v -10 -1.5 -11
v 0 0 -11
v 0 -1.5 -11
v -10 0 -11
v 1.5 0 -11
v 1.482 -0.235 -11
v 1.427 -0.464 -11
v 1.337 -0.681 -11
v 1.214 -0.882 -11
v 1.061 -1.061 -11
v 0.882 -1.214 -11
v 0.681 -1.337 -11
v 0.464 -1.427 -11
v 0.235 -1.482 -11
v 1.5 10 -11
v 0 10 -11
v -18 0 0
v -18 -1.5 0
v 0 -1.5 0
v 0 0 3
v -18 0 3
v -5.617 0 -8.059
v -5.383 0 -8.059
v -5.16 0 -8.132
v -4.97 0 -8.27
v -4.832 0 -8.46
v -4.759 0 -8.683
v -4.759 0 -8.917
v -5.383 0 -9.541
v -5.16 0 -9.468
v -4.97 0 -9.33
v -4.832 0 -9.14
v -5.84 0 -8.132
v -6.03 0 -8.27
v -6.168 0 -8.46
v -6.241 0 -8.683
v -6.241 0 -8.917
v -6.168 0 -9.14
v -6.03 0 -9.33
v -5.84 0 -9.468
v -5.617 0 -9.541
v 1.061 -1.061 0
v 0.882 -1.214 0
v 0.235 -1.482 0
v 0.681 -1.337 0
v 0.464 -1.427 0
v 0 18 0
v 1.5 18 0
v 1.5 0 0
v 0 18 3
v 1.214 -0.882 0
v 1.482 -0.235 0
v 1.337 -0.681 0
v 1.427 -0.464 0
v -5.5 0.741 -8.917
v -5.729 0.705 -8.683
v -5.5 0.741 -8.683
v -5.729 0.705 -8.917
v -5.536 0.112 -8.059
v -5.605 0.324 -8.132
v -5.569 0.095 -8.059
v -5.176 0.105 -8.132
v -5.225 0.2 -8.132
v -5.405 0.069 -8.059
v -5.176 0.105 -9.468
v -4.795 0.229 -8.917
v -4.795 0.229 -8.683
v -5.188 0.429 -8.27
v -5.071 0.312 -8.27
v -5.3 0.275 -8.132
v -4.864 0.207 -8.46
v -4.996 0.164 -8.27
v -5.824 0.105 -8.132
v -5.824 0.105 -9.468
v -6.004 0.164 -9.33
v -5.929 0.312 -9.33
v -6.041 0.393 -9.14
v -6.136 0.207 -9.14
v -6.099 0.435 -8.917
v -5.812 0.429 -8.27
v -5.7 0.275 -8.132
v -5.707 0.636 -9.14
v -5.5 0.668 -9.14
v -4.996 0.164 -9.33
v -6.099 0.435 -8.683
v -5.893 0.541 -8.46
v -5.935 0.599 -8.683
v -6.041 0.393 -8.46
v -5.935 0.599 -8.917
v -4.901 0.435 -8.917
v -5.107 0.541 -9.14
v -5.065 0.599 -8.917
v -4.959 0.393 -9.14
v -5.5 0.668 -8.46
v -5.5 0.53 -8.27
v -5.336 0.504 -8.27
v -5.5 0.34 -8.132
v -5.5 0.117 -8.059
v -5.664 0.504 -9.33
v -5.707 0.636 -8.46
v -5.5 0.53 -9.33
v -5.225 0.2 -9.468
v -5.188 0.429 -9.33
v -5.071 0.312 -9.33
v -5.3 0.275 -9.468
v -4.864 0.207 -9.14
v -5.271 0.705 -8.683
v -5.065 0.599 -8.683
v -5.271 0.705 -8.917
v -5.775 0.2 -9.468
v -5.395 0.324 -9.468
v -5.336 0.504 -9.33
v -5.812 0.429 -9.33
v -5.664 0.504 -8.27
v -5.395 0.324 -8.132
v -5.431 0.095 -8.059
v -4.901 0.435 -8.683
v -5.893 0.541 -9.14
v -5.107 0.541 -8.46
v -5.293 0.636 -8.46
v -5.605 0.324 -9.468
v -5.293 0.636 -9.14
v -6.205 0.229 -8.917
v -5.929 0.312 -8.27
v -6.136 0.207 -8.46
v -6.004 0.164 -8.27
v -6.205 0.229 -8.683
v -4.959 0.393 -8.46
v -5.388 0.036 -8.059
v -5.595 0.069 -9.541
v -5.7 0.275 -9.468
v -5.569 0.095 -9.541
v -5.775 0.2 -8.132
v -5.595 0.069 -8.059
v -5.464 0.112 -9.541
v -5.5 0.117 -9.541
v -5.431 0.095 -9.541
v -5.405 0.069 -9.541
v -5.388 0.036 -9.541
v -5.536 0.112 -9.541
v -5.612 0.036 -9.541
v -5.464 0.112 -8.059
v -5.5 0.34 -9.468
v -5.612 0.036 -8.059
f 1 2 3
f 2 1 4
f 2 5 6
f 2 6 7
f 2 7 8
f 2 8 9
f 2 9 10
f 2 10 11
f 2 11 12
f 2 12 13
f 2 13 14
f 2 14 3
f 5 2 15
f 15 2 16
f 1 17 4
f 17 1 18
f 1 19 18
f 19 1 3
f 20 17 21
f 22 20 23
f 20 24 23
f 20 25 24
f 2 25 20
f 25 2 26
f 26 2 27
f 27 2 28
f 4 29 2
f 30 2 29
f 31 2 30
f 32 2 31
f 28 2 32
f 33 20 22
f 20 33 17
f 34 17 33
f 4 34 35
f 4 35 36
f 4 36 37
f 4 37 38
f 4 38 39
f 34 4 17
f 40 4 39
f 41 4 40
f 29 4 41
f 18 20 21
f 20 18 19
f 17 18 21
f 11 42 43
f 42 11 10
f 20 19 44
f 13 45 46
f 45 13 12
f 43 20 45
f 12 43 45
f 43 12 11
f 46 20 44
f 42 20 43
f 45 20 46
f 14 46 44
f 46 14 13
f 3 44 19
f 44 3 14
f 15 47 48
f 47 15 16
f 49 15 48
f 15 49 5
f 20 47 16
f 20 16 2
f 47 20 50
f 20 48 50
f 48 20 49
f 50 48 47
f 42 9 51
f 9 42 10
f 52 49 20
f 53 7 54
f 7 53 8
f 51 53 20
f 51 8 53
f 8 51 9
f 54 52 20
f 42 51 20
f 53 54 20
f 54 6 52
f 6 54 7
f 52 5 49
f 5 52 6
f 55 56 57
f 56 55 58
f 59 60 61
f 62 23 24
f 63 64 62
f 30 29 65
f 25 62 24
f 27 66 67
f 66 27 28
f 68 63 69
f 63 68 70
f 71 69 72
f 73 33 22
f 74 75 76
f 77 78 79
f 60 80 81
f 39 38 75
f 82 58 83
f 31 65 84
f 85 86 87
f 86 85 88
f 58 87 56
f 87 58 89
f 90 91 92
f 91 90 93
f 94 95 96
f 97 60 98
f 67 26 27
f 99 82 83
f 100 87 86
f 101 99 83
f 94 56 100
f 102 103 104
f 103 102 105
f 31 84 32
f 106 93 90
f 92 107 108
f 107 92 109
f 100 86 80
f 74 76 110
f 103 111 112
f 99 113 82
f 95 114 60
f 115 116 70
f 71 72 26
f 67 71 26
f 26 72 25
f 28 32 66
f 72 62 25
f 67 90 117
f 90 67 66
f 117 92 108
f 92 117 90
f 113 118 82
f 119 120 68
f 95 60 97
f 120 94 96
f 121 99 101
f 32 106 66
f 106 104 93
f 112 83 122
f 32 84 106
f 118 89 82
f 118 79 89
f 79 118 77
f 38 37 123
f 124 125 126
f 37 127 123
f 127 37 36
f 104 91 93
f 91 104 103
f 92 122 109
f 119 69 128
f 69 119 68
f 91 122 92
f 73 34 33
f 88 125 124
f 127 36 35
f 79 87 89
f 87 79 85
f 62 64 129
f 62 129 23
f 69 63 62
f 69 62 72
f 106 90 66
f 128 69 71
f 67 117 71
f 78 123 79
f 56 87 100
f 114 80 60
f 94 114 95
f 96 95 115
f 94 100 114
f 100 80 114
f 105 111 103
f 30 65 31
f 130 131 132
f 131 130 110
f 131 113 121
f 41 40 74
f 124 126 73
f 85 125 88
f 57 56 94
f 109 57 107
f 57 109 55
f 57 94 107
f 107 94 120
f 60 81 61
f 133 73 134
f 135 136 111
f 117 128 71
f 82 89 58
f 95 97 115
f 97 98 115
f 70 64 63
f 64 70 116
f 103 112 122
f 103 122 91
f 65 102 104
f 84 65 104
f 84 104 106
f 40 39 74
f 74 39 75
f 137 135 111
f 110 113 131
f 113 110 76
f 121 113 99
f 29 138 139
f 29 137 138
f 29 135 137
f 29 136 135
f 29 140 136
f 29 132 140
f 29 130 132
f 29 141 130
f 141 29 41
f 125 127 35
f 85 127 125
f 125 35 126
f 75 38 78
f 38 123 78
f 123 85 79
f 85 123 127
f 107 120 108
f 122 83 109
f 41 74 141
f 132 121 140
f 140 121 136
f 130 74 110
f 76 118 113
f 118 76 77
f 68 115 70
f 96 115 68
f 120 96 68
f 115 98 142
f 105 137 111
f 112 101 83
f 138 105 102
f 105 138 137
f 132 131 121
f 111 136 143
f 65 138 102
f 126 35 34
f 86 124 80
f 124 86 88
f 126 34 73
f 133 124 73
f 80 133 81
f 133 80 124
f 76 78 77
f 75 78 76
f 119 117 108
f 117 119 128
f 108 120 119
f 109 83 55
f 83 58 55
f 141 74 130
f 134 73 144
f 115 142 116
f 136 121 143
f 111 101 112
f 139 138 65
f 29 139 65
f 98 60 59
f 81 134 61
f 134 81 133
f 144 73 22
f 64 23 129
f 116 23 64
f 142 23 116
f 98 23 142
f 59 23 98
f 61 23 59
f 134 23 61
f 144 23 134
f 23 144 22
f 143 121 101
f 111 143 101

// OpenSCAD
module base_clip() {
    module base_clip_side() {
        wb=18;
        wt=10;
        h=11;
        t=1.5;
        
        // clip
        rotate(90, [1, 0, 0])
        translate([-wb, -h, 0])
        linear_extrude(height=t)
        polygon([
            [0, h],
            [wb-wt, 0],
            [wb, 0],
            [wb, h]
        ]);
        
        // top
        rotate(-90, [0, 0, 1])
        rotate(90, [1, 0, 0])
        linear_extrude(height=wb)
        polygon([
            [0, 0],
            [0, t*2],
            [t, 0]
        ]);
        
        // corner
        rotate(-45, [0, 0, 1])
        rotate_extrude(angle=-45, $fn=40)
        polygon([
            [0, t*2],
            [t, 0],
            [t, -h],
            [0, -h]
        ]);
    }

    hole_x=5.5;
    hole_y=8.8;
    
    union() {
        color("red") base_clip_side();
        color("blue") mirror([1, 0, 0]) rotate(-90, [0, 0, 1]) base_clip_side();
        color("yellow") translate([-hole_x, 0, -hole_y]) sphere(d=1.5, $fn=20);
    };
}

base_clip();
